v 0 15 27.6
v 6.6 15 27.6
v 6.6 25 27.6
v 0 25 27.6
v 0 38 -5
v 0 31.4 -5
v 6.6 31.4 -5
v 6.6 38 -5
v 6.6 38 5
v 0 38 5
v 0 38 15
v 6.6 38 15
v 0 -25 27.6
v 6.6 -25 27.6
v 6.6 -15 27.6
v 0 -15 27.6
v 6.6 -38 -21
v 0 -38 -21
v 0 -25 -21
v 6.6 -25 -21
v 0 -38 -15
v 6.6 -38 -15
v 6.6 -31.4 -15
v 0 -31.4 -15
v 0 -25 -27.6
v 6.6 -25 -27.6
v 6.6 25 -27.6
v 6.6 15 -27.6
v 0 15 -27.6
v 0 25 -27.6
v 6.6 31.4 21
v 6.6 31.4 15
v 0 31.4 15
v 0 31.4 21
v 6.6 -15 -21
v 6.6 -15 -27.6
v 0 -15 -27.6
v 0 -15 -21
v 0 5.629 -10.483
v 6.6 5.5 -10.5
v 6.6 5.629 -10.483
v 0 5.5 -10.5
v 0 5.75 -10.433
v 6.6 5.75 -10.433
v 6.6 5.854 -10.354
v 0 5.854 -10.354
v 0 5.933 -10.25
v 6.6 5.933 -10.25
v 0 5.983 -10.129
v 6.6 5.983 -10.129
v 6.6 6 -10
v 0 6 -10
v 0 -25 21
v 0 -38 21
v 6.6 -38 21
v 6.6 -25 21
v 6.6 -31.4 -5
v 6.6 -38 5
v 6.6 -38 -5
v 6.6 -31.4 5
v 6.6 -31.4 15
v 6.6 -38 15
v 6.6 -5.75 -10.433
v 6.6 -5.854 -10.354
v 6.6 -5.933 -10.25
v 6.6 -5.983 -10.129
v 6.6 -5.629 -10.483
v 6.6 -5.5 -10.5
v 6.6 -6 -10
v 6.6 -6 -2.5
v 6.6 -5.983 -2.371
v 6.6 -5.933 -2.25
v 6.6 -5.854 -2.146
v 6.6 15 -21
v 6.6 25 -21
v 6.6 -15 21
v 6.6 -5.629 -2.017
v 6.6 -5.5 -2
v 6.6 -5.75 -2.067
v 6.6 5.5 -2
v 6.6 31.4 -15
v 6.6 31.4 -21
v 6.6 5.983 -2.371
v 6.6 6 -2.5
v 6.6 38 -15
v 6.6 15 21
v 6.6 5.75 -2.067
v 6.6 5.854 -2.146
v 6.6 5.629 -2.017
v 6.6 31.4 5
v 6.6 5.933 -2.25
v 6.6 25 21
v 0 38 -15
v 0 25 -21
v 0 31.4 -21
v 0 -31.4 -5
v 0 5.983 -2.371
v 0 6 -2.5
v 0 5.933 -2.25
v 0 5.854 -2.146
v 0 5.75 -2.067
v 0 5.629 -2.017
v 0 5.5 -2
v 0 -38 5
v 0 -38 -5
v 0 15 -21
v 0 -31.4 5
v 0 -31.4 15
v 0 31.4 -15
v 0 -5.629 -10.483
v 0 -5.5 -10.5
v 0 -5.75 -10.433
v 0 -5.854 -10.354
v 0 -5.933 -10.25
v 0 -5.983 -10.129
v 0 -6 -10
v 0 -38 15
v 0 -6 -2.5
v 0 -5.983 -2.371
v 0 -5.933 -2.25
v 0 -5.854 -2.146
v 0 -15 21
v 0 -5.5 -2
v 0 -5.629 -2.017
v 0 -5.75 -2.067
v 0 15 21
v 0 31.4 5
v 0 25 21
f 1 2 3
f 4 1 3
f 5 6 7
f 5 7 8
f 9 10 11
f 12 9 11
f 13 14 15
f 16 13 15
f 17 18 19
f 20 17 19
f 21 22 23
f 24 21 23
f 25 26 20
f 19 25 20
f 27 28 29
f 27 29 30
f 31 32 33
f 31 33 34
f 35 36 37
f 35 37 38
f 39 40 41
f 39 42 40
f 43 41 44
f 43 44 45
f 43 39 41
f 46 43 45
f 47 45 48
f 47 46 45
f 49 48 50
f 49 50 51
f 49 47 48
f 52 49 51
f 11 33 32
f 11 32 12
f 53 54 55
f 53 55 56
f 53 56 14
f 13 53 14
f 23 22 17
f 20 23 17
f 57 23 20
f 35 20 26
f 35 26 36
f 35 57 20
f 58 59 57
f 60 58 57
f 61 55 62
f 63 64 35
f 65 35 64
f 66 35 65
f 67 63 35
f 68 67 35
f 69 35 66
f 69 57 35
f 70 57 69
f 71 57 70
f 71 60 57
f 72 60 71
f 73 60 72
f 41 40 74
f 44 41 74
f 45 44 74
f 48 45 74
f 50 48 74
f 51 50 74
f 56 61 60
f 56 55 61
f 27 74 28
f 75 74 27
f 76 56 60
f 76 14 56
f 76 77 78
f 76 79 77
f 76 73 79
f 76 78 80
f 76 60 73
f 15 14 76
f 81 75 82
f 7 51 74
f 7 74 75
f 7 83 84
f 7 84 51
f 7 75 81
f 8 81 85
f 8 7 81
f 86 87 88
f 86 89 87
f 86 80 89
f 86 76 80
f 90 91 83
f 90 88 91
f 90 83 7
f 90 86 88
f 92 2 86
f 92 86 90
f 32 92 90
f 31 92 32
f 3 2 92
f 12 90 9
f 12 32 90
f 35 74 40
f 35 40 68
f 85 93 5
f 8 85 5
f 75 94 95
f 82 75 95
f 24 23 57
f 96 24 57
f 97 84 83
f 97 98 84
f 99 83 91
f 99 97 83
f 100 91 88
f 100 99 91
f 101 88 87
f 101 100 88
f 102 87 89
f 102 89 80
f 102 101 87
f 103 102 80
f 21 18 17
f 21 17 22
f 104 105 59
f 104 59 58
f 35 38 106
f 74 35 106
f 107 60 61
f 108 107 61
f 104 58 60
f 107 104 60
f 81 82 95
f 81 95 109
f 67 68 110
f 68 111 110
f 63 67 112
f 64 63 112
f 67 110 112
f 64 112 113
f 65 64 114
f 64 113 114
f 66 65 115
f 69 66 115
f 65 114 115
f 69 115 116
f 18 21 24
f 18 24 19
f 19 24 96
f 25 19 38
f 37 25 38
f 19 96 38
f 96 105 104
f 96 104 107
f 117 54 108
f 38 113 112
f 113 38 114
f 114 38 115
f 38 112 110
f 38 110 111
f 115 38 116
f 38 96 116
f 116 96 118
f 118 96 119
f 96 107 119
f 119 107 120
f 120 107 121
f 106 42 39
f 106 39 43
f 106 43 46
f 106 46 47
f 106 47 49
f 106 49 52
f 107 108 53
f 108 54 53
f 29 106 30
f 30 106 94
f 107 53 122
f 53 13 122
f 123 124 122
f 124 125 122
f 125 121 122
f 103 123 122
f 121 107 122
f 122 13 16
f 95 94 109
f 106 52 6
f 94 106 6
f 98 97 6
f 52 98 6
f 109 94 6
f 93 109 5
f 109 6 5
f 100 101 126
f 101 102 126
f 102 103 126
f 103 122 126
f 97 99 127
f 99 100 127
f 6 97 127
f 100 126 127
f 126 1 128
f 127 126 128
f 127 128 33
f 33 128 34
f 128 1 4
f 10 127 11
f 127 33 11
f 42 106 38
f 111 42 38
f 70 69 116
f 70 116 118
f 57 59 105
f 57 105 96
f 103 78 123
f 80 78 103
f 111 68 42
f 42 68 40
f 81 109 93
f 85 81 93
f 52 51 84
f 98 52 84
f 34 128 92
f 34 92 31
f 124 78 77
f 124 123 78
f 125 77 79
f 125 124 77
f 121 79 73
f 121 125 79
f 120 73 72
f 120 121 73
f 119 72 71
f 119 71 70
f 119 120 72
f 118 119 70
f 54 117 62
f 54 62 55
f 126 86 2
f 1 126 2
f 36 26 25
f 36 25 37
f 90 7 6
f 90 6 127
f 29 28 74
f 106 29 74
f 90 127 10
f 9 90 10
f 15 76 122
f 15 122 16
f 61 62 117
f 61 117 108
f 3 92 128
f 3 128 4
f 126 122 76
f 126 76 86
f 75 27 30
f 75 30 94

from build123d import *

# Parameters (mm, degrees)
F0_W     = 76
F0_H     = 42
F1_DEPTH = 6.6
F2_W     = 10
F2_H     = 6.6
F3_DEPTH = 6.6
F4_W     = 6.6
F4_H     = 6
F4_H_2   = 10
F5_DEPTH = 6.6
F6_W     = 12
F6_H     = 8.5
F7_DEPTH = 6.6
F8_R     = 0.5


with BuildPart() as f1:
    # F0 (on Right) → F1 (new body)
    with BuildSketch(Plane.YZ):
        Rectangle(F0_W, F0_H)
    extrude(amount=F1_DEPTH)

    # F2 (on face) → F3 (join)
    with BuildSketch(Plane.YZ.offset(6.6)):
        with Locations((-20, 24.3)):
            Rectangle(F2_W, F2_H)
        with Locations((20, 24.3)):
            Rectangle(F2_W, F2_H)
        with Locations((20, -24.3)):
            Rectangle(F2_W, F2_H)
        with Locations((-20, -24.3)):
            Rectangle(F2_W, F2_H)
    extrude(amount=-F3_DEPTH)

    # F4 (on face) → F5 (cut, through all)
    with BuildSketch(Plane.YZ.offset(6.6)):
        with Locations((34.7, 18)):
            Rectangle(F4_W, F4_H)
        with Locations((34.7, -18)):
            Rectangle(F4_W, F4_H)
        with Locations((34.7, 0)):
            Rectangle(F4_W, F4_H_2)
        with Locations((-34.7, 10)):
            Rectangle(F4_W, F4_H_2)
        with Locations((-34.7, -10)):
            Rectangle(F4_W, F4_H_2)
    extrude(amount=-F5_DEPTH, mode=Mode.SUBTRACT)

    # F6 (on face) → F7 (cut, through all)
    with BuildSketch(Plane.YZ.offset(6.6)):
        with Locations((0, -6.25)):
            Rectangle(F6_W, F6_H)
    extrude(amount=-F7_DEPTH, mode=Mode.SUBTRACT)

    # F8
    f8_edges = [f1.edges().sort_by_distance(p)[0] for p in [
        (3.3, -6, -2),
        (3.3, 6, -2),
        (3.3, 6, -10.5),
        (3.3, -6, -10.5),
    ]]
    fillet(f8_edges, radius=F8_R)


solid = f1.part
